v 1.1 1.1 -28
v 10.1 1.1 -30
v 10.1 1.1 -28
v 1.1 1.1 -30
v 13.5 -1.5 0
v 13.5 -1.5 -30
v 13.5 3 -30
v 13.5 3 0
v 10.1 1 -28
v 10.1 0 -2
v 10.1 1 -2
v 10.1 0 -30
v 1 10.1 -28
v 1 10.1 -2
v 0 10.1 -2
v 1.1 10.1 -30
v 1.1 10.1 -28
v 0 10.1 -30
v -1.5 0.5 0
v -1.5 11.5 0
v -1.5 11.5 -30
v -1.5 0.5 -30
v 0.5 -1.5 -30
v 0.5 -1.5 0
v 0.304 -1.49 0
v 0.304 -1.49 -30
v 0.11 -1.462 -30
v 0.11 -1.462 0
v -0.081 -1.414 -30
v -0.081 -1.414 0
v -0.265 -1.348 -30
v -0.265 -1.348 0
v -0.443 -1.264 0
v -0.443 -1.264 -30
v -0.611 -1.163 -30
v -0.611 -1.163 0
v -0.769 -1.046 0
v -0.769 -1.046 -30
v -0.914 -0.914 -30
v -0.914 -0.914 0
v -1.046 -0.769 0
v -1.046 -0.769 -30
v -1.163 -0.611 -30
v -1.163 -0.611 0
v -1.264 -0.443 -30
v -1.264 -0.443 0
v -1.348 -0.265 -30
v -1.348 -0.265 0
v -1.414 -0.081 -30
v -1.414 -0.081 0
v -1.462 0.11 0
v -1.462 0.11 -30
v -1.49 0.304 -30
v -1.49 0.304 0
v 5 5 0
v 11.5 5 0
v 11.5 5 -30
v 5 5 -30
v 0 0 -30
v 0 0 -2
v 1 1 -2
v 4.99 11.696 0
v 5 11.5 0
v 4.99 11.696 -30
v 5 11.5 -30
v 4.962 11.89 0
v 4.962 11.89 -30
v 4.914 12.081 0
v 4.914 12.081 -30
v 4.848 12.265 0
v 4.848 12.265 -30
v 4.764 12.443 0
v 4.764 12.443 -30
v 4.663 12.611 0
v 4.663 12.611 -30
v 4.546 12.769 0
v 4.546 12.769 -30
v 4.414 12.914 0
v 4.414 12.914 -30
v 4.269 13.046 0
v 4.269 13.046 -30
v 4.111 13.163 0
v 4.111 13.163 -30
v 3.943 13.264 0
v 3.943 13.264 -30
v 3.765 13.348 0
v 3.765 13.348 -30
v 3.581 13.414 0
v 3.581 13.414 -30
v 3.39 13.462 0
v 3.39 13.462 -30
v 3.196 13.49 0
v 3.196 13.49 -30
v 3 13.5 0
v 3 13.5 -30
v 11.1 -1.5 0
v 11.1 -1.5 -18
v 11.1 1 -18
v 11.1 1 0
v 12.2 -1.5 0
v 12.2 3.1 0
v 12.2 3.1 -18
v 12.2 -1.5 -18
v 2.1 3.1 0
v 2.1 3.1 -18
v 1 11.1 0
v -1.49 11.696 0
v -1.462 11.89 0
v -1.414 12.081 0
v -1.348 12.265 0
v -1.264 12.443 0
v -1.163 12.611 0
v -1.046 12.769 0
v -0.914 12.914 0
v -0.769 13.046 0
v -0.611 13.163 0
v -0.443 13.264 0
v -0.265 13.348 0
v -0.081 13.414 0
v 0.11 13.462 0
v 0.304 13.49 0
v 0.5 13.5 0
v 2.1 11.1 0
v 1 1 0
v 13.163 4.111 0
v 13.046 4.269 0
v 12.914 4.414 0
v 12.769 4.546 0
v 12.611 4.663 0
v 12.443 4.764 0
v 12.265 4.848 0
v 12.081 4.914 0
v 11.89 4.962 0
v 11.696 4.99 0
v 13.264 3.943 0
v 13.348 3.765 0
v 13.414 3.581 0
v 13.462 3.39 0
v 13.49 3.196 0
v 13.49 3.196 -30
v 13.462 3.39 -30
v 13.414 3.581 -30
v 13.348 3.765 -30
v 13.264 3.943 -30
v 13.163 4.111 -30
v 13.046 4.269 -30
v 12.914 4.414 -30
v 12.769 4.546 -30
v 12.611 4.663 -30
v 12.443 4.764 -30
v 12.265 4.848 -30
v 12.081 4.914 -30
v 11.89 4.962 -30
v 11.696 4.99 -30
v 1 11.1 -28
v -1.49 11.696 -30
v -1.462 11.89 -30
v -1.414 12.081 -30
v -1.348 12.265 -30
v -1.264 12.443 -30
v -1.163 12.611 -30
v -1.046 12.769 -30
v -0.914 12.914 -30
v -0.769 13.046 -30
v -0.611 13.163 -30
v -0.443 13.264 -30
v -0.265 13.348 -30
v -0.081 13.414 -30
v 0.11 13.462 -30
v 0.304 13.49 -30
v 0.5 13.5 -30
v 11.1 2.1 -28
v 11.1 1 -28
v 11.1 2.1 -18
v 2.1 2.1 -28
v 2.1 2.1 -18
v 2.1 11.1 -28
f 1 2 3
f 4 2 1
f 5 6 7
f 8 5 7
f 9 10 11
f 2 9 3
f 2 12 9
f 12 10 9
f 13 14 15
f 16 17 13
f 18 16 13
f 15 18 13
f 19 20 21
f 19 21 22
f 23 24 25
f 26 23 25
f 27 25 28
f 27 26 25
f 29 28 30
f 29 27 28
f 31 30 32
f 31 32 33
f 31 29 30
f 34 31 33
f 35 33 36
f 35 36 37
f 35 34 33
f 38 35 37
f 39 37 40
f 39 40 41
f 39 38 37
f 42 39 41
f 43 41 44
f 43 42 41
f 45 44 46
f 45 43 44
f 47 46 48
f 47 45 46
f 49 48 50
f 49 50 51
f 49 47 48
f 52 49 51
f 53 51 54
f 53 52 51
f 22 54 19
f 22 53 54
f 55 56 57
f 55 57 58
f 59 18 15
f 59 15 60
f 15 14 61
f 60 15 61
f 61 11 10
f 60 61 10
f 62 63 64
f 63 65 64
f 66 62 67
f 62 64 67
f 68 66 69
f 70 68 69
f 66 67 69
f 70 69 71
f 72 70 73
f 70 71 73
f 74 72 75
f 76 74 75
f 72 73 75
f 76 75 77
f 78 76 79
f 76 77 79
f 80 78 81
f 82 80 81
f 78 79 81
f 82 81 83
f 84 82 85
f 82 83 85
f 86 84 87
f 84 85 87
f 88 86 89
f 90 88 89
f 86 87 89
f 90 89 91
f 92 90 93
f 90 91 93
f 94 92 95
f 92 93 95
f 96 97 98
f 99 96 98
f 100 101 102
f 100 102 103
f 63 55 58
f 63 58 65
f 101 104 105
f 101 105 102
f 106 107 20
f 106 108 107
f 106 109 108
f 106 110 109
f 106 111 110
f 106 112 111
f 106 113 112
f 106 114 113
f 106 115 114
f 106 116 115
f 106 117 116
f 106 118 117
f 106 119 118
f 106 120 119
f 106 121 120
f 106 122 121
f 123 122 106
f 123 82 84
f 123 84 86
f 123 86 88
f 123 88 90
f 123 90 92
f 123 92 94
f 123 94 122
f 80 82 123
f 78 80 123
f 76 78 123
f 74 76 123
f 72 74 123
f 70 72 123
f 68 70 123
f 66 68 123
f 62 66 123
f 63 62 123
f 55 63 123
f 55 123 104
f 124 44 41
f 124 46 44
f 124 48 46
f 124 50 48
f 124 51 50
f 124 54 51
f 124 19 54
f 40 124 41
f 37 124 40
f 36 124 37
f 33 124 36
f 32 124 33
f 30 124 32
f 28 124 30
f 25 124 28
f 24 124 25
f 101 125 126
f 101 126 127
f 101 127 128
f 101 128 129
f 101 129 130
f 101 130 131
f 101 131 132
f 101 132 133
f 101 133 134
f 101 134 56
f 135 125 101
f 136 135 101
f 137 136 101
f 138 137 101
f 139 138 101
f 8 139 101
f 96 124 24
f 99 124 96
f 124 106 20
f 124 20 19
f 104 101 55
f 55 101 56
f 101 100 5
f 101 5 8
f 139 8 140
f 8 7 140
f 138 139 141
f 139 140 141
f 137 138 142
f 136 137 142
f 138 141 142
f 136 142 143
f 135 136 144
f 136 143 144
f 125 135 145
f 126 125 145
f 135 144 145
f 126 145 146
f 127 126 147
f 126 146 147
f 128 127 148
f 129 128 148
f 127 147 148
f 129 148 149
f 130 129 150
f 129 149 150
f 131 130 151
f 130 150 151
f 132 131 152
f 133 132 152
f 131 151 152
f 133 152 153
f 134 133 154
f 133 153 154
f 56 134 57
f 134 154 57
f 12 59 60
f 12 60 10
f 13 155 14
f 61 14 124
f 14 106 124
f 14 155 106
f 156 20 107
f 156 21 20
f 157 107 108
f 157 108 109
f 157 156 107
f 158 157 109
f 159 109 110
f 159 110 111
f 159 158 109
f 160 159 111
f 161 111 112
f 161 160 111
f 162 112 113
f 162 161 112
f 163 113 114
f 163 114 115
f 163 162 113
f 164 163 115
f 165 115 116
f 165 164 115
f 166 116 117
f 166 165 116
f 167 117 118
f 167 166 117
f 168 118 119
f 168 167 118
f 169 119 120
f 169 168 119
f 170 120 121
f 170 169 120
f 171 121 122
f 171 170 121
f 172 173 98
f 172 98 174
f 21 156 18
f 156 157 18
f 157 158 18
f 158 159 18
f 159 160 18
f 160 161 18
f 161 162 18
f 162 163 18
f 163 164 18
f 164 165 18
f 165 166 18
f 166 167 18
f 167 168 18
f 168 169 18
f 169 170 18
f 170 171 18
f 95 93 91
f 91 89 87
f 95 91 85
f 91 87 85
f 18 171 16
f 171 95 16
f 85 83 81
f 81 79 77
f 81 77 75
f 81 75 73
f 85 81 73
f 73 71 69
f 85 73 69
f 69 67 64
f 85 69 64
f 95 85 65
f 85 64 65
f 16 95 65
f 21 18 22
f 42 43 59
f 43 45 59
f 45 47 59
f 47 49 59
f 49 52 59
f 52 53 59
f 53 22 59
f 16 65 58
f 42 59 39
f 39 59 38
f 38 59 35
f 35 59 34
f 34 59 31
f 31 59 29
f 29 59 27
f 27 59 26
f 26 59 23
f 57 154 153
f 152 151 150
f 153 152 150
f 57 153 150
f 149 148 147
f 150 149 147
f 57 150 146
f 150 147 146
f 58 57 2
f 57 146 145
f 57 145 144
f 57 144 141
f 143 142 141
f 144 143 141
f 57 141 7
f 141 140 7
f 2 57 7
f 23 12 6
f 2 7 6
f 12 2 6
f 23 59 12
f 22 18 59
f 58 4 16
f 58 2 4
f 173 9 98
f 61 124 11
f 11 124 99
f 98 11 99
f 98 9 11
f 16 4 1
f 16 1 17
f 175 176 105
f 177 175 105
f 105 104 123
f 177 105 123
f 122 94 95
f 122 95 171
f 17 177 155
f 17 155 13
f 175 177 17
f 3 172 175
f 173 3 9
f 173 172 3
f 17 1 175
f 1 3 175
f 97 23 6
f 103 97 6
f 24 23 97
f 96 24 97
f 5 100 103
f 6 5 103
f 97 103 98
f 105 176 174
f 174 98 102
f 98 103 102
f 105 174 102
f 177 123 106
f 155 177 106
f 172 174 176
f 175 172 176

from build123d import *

# Parameters (mm, degrees)
PAD_DEPTH                          = 30
POCKET012_DEPTH                    = 28
POCKET013_DEPTH                    = 28
POCKET014_DEPTH                    = 18
FILLET005_R                        = 2
B_BOTTOM_CONNECTOR_ROLL_ANGLE      = 180
B_BOTTOM_CONNECTOR_PLACEMENT_ANGLE = 90


with BuildPart() as part:
    # Sketch039 → Pad (new body)
    with BuildSketch(Plane.XY):
        Polygon((5, 5), (13.5, 5), (13.5, -1.5), (-1.5, -1.5), (-1.5, 13.5), (5, 13.5), align=None)
    extrude(amount=PAD_DEPTH)

    # Sketch041 (on DatumPlane) → Pocket012 (cut)
    with BuildSketch(Plane.XY.offset(30)):
        Polygon((0, 10.1), (1.1, 10.1), (1.1, 1.1), (10.1, 1.1), (10.1, 0), (0, 0), align=None)
    extrude(amount=-POCKET012_DEPTH, mode=Mode.SUBTRACT)

    # Sketch040 (on X_Axis) → Pocket013 (cut)
    with BuildSketch(Plane.XY):
        Polygon((1, 11.1), (2.1, 11.1), (2.1, 2.1), (11.1, 2.1), (11.1, 1), (1, 1), align=None)
    extrude(amount=POCKET013_DEPTH, mode=Mode.SUBTRACT)

    # Sketch042 → Pocket014 (cut)
    with BuildSketch(Plane.XY):
        Polygon((2, 2.1), (3.1, 2.1), (3.1, 12.2), (-7, 12.2), (-7, 11.1), (2, 11.1), align=None)
    extrude(amount=POCKET014_DEPTH, mode=Mode.SUBTRACT)

    # Fillet005
    fillet005_edges = [part.edges().sort_by_distance(p)[0] for p in [
        (13.5, -1.5, 15),
        (-1.5, -1.5, 15),
        (13.5, 5, 15),
        (5, 13.5, 15),
    ]]
    fillet(fillet005_edges, radius=FILLET005_R)


with BuildPart() as part_1:
    # b_bottom_connector roll: moved
    add(part.part.rotate(Axis((0, 0, 0), (1, 0, 0)), B_BOTTOM_CONNECTOR_ROLL_ANGLE))


with BuildPart() as part_2:
    # b_bottom_connector placement: moved
    add(part_1.part.rotate(Axis((0, 0, 0), (0, 0, 1)), B_BOTTOM_CONNECTOR_PLACEMENT_ANGLE))


solid = part_2.part
